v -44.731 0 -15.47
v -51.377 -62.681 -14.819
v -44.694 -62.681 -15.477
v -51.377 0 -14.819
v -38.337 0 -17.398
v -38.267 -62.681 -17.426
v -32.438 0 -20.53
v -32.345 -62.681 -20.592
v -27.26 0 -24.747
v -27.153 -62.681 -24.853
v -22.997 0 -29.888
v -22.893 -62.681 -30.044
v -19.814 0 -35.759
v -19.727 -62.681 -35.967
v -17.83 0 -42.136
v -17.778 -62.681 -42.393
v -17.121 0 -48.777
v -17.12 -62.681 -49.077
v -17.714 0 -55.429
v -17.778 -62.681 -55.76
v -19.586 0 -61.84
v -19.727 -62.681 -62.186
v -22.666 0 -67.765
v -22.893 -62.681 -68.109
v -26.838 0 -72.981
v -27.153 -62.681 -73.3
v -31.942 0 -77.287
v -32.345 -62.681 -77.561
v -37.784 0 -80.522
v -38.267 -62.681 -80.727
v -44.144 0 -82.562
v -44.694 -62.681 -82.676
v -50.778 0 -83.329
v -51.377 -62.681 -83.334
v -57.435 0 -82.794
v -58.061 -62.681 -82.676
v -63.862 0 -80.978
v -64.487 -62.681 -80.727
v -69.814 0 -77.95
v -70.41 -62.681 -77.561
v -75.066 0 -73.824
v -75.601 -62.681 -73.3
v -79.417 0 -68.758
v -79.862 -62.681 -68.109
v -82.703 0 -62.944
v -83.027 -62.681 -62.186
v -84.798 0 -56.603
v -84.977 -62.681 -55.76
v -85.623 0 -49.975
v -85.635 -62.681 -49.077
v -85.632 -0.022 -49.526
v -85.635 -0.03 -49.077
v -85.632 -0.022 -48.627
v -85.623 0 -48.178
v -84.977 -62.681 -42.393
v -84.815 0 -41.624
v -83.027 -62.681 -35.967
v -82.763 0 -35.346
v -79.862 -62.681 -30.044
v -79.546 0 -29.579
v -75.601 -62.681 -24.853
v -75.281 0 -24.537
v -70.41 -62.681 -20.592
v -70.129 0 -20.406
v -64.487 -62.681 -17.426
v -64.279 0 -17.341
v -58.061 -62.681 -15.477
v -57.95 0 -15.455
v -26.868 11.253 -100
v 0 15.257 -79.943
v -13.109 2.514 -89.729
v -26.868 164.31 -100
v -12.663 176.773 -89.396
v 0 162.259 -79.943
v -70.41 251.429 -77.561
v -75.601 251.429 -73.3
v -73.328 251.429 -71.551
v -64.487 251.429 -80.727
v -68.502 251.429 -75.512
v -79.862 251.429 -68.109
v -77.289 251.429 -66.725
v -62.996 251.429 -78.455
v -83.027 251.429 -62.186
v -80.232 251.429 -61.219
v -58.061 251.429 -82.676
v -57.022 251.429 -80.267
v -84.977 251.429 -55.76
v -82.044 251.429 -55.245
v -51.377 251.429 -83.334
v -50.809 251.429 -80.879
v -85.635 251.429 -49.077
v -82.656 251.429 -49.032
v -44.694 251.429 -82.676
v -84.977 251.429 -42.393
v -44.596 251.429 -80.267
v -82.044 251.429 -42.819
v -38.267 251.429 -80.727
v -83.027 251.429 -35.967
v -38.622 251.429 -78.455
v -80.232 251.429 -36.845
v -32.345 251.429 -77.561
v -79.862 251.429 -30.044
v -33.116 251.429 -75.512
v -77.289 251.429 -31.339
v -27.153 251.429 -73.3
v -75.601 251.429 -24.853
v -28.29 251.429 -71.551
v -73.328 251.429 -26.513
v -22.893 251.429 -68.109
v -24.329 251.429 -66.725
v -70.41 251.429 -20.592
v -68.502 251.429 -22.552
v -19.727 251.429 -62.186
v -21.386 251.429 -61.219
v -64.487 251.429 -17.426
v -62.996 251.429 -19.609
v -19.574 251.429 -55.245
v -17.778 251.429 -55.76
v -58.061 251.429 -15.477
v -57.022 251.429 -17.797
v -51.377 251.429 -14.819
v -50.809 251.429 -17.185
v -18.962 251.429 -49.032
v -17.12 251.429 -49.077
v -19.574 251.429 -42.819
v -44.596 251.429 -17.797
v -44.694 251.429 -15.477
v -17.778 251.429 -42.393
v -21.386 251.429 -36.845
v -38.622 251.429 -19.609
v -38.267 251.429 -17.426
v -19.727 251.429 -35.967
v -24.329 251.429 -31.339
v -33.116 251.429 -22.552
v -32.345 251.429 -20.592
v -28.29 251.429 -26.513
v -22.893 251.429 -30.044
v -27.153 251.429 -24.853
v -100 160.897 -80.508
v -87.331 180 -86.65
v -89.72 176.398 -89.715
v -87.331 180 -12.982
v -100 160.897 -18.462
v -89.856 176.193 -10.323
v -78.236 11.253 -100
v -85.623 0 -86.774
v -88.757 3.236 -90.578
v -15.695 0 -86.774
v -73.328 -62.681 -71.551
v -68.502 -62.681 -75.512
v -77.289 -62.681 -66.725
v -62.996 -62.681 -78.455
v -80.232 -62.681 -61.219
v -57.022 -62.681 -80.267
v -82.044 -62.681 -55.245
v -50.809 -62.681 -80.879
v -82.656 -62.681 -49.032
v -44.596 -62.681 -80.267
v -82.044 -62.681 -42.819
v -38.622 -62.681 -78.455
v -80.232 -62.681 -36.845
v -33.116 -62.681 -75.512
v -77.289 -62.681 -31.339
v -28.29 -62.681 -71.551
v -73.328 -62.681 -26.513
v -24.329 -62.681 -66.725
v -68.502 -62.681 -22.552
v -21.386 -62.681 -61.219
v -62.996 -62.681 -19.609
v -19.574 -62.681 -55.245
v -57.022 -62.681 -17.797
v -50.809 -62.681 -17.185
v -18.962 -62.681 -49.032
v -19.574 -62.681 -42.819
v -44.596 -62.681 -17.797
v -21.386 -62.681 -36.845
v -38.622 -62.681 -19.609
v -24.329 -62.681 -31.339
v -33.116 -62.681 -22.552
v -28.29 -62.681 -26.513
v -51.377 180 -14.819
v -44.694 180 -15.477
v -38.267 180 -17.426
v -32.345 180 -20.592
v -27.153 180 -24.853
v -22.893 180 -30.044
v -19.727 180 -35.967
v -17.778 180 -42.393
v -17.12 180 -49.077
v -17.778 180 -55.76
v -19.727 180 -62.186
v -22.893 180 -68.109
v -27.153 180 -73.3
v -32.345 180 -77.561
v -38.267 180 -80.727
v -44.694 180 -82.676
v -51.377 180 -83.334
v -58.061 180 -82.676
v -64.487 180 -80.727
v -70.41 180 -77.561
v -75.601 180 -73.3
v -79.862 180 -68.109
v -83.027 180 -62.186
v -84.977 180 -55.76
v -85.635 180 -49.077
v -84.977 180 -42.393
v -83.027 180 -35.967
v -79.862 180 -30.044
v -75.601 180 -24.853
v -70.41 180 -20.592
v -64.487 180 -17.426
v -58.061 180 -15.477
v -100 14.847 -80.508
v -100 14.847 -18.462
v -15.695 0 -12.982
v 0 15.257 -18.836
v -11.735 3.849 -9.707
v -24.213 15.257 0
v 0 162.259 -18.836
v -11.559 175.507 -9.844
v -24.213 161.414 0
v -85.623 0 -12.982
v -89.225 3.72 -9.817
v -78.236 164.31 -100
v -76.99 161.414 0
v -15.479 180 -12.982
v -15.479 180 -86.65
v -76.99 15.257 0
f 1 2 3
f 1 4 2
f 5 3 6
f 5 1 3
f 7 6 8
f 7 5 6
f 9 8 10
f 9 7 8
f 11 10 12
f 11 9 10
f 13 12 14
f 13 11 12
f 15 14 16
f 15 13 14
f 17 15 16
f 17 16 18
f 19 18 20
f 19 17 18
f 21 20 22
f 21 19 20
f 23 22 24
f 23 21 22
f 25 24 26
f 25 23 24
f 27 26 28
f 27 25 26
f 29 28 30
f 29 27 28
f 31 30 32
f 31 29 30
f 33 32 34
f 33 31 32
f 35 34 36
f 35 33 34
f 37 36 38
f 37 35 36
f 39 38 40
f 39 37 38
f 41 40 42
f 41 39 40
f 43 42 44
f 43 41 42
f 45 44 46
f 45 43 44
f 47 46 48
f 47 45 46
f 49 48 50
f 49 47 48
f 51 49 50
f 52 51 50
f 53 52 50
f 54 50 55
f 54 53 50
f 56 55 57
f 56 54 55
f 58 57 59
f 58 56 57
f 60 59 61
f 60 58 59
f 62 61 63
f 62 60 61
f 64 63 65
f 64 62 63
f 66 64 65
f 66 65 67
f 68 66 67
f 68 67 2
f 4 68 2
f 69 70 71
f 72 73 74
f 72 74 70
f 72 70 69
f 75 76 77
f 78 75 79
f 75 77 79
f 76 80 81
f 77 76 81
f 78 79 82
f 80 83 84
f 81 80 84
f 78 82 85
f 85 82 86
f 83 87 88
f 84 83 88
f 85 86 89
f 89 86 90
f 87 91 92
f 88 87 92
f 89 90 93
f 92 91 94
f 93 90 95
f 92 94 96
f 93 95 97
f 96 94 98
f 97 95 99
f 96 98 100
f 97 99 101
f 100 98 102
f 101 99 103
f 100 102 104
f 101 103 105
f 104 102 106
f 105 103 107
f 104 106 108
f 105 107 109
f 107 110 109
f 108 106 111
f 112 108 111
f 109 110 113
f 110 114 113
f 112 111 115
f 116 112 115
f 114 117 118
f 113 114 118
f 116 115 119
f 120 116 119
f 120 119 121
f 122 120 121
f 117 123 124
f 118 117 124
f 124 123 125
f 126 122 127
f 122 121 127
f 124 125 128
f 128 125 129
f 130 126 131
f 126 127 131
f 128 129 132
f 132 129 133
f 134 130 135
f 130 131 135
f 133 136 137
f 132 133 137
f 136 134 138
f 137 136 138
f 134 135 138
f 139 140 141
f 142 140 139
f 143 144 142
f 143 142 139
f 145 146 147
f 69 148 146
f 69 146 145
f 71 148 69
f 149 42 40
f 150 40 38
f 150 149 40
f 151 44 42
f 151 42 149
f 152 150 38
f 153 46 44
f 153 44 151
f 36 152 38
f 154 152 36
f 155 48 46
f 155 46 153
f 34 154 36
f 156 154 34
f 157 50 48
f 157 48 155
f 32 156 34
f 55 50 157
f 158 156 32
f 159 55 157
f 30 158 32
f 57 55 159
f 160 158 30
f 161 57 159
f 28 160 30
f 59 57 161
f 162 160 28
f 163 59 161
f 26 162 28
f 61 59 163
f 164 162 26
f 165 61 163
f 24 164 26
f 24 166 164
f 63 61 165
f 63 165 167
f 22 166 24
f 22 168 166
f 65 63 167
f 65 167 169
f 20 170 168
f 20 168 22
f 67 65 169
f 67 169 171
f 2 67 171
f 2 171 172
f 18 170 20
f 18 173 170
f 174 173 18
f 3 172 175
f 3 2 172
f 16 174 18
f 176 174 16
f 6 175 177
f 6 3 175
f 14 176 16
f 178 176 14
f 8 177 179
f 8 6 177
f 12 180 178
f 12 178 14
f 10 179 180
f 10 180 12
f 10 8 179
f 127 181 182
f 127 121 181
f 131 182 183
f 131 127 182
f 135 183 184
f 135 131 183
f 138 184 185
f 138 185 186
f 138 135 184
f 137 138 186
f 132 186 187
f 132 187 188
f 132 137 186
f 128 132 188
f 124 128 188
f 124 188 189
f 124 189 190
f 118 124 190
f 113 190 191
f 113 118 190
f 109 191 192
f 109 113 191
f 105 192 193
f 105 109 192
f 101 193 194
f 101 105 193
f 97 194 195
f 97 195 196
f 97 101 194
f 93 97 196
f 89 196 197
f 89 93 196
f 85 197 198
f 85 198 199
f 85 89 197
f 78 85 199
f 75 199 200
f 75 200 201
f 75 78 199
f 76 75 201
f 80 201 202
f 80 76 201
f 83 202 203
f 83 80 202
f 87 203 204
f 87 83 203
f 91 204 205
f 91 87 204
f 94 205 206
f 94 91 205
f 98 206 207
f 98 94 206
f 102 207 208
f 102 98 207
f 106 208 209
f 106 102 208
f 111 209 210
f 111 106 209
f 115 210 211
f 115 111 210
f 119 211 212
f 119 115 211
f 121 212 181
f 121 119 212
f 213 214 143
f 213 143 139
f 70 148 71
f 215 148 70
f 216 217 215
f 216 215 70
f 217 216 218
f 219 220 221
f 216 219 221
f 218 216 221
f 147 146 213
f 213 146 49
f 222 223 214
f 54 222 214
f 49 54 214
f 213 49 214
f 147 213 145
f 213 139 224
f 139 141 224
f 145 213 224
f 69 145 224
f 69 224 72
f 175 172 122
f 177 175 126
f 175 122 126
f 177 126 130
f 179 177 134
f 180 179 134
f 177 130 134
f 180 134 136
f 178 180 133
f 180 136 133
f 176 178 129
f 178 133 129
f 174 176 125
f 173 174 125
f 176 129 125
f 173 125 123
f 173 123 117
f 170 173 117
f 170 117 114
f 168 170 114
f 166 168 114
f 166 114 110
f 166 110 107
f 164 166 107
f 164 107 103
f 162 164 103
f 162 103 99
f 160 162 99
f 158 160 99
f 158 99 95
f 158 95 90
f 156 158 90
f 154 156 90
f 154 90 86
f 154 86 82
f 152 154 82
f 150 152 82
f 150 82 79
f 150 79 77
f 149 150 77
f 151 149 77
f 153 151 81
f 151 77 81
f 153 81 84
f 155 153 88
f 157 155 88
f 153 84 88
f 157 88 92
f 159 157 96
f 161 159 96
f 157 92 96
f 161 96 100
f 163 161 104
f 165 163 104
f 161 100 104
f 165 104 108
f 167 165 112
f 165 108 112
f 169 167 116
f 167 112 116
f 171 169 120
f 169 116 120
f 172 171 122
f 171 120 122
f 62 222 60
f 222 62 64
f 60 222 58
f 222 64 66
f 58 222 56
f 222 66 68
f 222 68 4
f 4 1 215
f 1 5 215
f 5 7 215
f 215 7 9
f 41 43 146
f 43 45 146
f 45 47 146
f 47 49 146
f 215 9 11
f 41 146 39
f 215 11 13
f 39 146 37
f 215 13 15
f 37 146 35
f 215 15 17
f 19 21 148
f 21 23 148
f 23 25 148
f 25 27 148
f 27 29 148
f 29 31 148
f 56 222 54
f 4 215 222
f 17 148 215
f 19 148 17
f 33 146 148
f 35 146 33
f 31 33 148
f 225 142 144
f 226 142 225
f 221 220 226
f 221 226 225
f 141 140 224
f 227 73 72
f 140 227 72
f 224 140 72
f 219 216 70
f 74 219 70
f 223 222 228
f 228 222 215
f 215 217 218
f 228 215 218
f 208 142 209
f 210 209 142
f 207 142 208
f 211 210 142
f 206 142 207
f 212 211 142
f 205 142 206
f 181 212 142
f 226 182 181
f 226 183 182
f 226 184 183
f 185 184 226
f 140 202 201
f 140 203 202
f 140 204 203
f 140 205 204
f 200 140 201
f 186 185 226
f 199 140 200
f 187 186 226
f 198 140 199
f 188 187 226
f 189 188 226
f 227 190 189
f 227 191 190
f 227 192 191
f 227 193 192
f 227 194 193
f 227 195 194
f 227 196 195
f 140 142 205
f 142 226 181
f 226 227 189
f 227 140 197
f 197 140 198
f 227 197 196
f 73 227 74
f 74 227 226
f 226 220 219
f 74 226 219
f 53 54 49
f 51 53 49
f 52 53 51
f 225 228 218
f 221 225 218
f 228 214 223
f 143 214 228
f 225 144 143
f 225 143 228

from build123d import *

# Parameters (mm, degrees)
SKETCH1_W           = 100
SKETCH1_H           = 100
BOSS_EXTRUDE1_DEPTH = 180
SKETCH2_R           = 34.257790197
BOSS_EXTRUDE2_DEPTH = 350
SKETCH3_W           = 152.006357392
SKETCH3_H           = 282.452416457
CUT_EXTRUDE2_DEPTH  = 400
CUT_EXTRUDE3_DEPTH  = 400
CUT_EXTRUDE4_DEPTH  = 400
CUT_EXTRUDE5_DEPTH  = 400
SKETCH7_W           = 160.159381639
SKETCH7_H           = 147.362276113
CUT_EXTRUDE6_DEPTH  = 400
SKETCH8_W           = 147.310744502
SKETCH8_H           = 162.038906966
CUT_EXTRUDE7_DEPTH  = 400
SKETCH9_R           = 31.847293423
CUT_EXTRUDE8_DEPTH  = 400


with BuildPart() as part:
    # Sketch1 → Boss-Extrude1 (new body)
    with BuildSketch(Plane(origin=(0, 0, 0), x_dir=(1, 0, 0), z_dir=(0, 1, 0))):
        with Locations((-50, 50)):
            Rectangle(SKETCH1_W, SKETCH1_H)
    extrude(amount=BOSS_EXTRUDE1_DEPTH)

    # Sketch2 → Boss-Extrude2 (add, symmetric)
    with BuildSketch(Plane(origin=(0, 180, 0), x_dir=(1, 0, 0), z_dir=(0, 1, 0))):
        with Locations(Location((-51.377291833, 49.076536384, 0), (0, 0, 270))):
            Circle(SKETCH2_R)
    extrude(amount=BOSS_EXTRUDE2_DEPTH, both=True)

    # Sketch3 → Cut-Extrude2 (cut)
    with BuildSketch(Plane(origin=(0, 0, 0), x_dir=(0, 0, -1), z_dir=(1, 0, 0))):
        with Locations((57.419900112, 502.274302507)):
            Rectangle(SKETCH3_W, SKETCH3_H)
    extrude(amount=-CUT_EXTRUDE2_DEPTH, mode=Mode.SUBTRACT)

    # Sketch4 → Cut-Extrude3 (cut)
    with BuildSketch(Plane(origin=(0, 0, 0), x_dir=(0, 0, -1), z_dir=(1, 0, 0))):
        Polygon((12.981970869, 0), (-8.994244796, 25.828096003), (-18.564506014, -15.259465835), align=None)
        Polygon((85.072517936, -1.448103984), (109.237639161, 19.113145112), (115.920034239, -3.267382694), align=None)
        Polygon((12.981970869, 180), (-8.994244796, 148.537596011), (-15.418178585, 193.219274892), align=None)
        Polygon((85.072517936, 181.854312784), (103.841225373, 159.795920888), (106.132549481, 198.647393934), align=None)
    extrude(amount=-CUT_EXTRUDE3_DEPTH, mode=Mode.SUBTRACT)

    # Sketch5 → Cut-Extrude4 (cut)
    with BuildSketch(Plane.XY):
        Polygon((-85.623287335, 0), (-106.370377984, 21.426392531), (-122.288861874, 3.209259887), (-93.526345261, -19.884701759), align=None)
        Polygon((-15.694988751, 0), (0, 15.257385304), (12.122677088, 15.257385304), (10.563067769, -19.884701759), align=None)
        Polygon((-87.166490339, 180.248071029), (-106.370377984, 151.29108453), (-117.705469457, 200.501115102), align=None)
        Polygon((-15.694988751, 180.248071029), (7.833767065, 153.279557508), (0, 193.941208308), align=None)
    extrude(amount=-CUT_EXTRUDE4_DEPTH, mode=Mode.SUBTRACT)

    # Sketch6 → Cut-Extrude5 (cut)
    with BuildSketch(Plane(origin=(0, 180, 0), x_dir=(1, 0, 0), z_dir=(0, 1, 0))):
        Polygon((-112.386997555, 28.400400964), (-64.261264503, -10.212759359), (-84.406366528, -15.51192827), (-124.649689542, -15.51192827), align=None)
        Polygon((-97.065537028, 135.861756084), (-119.37552445, 77.792688888), (-118.043343626, 64.347606737), (-66.428694172, 110.575168787), align=None)
        Polygon((-24.69640689, -21.815840769), (11.092108798, -8.97361337), (17.428316417, 32.393768119), (-38.531576846, -11.139157378), align=None)
        Polygon((-17.445484601, 140.804394854), (35.417473102, 107.262520599), (9.305452855, 72.996438725), (-31.724385352, 103.625272537), align=None)
    extrude(amount=-CUT_EXTRUDE5_DEPTH, mode=Mode.SUBTRACT)

    # Sketch7 → Cut-Extrude6 (cut)
    with BuildSketch(Plane.XY):
        with Locations((-66.123258915, -136.36252694)):
            Rectangle(SKETCH7_W, SKETCH7_H)
    extrude(amount=-CUT_EXTRUDE6_DEPTH, mode=Mode.SUBTRACT)

    # Sketch8 → Cut-Extrude7 (cut)
    with BuildSketch(Plane.XY):
        with Locations((-53.541153336, 332.448287589)):
            Rectangle(SKETCH8_W, SKETCH8_H)
    extrude(amount=-CUT_EXTRUDE7_DEPTH, mode=Mode.SUBTRACT)

    # Sketch9 → Cut-Extrude8 (cut)
    with BuildSketch(Plane(origin=(0, 251.428834106, 0), x_dir=(1, 0, 0), z_dir=(0, 1, 0))):
        with Locations(Location((-50.808993157, 49.032036374, 0), (0, 0, 270))):
            Circle(SKETCH9_R)
    extrude(amount=-CUT_EXTRUDE8_DEPTH, mode=Mode.SUBTRACT)


solid = part.part
